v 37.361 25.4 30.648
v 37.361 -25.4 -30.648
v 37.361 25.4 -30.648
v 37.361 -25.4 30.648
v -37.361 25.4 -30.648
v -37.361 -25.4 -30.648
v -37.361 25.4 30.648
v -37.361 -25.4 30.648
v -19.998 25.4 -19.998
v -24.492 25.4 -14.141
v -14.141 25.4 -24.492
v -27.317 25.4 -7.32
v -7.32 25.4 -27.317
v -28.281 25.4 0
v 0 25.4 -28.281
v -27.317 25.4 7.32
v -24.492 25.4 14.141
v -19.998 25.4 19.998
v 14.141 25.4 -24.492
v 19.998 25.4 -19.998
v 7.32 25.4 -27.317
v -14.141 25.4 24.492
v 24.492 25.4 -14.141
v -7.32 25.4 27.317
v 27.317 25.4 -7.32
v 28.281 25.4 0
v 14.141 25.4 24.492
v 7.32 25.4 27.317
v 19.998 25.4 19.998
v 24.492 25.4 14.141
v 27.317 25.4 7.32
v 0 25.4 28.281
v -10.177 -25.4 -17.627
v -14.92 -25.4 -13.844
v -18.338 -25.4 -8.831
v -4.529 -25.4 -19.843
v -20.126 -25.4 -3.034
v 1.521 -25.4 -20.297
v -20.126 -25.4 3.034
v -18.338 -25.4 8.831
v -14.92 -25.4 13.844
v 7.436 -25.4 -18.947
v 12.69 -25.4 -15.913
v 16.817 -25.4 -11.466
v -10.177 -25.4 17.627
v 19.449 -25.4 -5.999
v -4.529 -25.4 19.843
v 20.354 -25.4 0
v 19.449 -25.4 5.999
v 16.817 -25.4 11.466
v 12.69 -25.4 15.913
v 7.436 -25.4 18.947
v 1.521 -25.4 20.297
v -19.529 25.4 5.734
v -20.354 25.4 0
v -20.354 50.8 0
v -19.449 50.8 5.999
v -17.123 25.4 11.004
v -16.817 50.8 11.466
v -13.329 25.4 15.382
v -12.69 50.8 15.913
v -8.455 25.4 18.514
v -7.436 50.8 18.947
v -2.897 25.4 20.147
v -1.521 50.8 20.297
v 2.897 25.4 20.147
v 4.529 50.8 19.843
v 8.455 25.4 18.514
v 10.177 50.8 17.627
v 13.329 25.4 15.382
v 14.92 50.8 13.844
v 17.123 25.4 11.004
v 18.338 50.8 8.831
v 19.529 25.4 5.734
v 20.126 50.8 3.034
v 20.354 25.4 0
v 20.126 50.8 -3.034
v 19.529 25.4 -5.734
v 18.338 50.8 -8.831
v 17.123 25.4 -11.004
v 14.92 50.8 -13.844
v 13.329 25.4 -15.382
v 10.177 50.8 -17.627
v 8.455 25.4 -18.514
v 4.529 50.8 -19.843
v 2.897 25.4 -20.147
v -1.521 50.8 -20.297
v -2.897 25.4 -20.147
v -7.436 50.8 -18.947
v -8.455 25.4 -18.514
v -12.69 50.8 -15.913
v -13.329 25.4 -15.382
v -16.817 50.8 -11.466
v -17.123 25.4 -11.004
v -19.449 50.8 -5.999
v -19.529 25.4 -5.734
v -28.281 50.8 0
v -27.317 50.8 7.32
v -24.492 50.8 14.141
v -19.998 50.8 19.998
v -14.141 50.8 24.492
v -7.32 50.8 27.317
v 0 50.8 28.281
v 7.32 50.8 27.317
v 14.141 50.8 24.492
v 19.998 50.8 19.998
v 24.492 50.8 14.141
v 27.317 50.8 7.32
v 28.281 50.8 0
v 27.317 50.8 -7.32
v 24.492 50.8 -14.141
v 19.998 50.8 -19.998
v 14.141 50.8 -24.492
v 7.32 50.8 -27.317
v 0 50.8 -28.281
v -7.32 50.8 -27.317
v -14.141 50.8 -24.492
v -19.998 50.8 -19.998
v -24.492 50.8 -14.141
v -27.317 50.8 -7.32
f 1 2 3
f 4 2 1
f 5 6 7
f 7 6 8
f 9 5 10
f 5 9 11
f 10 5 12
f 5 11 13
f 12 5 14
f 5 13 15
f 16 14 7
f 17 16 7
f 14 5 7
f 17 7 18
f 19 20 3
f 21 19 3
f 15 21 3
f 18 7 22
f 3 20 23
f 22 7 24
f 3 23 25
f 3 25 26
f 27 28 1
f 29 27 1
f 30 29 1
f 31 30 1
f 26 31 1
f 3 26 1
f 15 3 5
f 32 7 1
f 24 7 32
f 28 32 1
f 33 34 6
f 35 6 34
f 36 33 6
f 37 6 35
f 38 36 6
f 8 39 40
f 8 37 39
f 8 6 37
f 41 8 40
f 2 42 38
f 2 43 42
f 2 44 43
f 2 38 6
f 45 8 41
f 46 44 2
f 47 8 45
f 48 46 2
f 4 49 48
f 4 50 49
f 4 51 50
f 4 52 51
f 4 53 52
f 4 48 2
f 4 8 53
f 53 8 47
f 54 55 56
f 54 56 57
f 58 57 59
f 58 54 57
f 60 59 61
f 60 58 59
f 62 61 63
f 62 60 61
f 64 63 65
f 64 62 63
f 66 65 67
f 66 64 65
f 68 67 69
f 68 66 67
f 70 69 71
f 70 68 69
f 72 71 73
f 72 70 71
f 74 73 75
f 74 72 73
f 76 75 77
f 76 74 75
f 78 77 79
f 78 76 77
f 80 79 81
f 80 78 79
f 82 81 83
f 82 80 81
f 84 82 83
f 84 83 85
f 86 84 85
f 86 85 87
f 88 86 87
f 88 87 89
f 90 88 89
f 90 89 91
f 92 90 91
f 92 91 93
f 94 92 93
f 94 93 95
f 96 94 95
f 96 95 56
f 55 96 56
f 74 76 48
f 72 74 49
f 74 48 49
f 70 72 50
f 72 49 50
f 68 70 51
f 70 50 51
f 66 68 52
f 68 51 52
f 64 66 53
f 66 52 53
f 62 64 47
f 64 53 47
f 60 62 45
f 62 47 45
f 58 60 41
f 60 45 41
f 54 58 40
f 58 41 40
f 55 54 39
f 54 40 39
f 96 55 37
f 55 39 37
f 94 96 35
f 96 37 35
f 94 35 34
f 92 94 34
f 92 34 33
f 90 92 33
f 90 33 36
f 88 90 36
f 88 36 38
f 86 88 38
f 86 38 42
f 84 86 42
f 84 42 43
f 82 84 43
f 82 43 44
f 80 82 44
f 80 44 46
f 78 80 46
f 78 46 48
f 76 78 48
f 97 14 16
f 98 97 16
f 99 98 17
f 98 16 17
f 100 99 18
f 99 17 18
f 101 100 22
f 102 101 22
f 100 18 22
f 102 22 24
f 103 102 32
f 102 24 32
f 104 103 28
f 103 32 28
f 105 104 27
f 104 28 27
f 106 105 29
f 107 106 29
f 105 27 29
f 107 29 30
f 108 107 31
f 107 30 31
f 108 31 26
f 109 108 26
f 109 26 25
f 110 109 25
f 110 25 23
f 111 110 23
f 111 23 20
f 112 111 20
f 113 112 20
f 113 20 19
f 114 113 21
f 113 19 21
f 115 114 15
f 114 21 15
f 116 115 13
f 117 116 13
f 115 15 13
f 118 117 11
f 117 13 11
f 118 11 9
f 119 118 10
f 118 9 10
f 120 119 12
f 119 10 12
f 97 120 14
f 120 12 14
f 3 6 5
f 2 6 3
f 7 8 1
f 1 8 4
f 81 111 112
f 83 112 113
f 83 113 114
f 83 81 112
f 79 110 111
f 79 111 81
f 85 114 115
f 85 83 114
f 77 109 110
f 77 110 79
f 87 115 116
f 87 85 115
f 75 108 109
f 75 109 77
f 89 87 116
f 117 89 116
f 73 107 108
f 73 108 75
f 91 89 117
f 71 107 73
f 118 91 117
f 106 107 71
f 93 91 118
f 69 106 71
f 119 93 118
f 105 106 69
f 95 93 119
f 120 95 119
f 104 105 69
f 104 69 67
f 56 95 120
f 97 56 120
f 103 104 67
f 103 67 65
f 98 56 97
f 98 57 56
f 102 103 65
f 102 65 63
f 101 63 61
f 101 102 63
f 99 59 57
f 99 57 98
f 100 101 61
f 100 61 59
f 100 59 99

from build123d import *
from build123d import SkipClean  # not in build123d's __all__

# Parameters (mm, degrees)
F0_W     = 74.7220367193
F0_H     = 61.2964034081
F1_DEPTH = 25.4
F2_R     = 20.3537507695
F3_DEPTH = 50.801
F4_R     = 28.2811450825
F4_R_2   = 20.3537507695
F5_DEPTH = 25.4


with BuildPart() as f1:
    # F0 (on Front) → F1 (new body, symmetric)
    with BuildSketch(Plane.XZ):
        Rectangle(F0_W, F0_H)
    extrude(amount=F1_DEPTH, both=True)

    # F2 (on face) → F3 (cut, through all)
    with BuildSketch(Plane.XZ.offset(25.4)):
        Circle(F2_R)
    extrude(amount=-F3_DEPTH, mode=Mode.SUBTRACT)

    # F4 (on face) → F5 (join)
    with BuildSketch(Plane(origin=(0, 25.4, 0), x_dir=(-1, 0, 0), z_dir=(0, 1, 0))):
        Circle(F4_R)
        Circle(F4_R_2, mode=Mode.SUBTRACT)
    with SkipClean():  # cleaning this boolean's faces spoils the solid; the shape is the same uncleaned
        extrude(amount=F5_DEPTH)


solid = f1.part
